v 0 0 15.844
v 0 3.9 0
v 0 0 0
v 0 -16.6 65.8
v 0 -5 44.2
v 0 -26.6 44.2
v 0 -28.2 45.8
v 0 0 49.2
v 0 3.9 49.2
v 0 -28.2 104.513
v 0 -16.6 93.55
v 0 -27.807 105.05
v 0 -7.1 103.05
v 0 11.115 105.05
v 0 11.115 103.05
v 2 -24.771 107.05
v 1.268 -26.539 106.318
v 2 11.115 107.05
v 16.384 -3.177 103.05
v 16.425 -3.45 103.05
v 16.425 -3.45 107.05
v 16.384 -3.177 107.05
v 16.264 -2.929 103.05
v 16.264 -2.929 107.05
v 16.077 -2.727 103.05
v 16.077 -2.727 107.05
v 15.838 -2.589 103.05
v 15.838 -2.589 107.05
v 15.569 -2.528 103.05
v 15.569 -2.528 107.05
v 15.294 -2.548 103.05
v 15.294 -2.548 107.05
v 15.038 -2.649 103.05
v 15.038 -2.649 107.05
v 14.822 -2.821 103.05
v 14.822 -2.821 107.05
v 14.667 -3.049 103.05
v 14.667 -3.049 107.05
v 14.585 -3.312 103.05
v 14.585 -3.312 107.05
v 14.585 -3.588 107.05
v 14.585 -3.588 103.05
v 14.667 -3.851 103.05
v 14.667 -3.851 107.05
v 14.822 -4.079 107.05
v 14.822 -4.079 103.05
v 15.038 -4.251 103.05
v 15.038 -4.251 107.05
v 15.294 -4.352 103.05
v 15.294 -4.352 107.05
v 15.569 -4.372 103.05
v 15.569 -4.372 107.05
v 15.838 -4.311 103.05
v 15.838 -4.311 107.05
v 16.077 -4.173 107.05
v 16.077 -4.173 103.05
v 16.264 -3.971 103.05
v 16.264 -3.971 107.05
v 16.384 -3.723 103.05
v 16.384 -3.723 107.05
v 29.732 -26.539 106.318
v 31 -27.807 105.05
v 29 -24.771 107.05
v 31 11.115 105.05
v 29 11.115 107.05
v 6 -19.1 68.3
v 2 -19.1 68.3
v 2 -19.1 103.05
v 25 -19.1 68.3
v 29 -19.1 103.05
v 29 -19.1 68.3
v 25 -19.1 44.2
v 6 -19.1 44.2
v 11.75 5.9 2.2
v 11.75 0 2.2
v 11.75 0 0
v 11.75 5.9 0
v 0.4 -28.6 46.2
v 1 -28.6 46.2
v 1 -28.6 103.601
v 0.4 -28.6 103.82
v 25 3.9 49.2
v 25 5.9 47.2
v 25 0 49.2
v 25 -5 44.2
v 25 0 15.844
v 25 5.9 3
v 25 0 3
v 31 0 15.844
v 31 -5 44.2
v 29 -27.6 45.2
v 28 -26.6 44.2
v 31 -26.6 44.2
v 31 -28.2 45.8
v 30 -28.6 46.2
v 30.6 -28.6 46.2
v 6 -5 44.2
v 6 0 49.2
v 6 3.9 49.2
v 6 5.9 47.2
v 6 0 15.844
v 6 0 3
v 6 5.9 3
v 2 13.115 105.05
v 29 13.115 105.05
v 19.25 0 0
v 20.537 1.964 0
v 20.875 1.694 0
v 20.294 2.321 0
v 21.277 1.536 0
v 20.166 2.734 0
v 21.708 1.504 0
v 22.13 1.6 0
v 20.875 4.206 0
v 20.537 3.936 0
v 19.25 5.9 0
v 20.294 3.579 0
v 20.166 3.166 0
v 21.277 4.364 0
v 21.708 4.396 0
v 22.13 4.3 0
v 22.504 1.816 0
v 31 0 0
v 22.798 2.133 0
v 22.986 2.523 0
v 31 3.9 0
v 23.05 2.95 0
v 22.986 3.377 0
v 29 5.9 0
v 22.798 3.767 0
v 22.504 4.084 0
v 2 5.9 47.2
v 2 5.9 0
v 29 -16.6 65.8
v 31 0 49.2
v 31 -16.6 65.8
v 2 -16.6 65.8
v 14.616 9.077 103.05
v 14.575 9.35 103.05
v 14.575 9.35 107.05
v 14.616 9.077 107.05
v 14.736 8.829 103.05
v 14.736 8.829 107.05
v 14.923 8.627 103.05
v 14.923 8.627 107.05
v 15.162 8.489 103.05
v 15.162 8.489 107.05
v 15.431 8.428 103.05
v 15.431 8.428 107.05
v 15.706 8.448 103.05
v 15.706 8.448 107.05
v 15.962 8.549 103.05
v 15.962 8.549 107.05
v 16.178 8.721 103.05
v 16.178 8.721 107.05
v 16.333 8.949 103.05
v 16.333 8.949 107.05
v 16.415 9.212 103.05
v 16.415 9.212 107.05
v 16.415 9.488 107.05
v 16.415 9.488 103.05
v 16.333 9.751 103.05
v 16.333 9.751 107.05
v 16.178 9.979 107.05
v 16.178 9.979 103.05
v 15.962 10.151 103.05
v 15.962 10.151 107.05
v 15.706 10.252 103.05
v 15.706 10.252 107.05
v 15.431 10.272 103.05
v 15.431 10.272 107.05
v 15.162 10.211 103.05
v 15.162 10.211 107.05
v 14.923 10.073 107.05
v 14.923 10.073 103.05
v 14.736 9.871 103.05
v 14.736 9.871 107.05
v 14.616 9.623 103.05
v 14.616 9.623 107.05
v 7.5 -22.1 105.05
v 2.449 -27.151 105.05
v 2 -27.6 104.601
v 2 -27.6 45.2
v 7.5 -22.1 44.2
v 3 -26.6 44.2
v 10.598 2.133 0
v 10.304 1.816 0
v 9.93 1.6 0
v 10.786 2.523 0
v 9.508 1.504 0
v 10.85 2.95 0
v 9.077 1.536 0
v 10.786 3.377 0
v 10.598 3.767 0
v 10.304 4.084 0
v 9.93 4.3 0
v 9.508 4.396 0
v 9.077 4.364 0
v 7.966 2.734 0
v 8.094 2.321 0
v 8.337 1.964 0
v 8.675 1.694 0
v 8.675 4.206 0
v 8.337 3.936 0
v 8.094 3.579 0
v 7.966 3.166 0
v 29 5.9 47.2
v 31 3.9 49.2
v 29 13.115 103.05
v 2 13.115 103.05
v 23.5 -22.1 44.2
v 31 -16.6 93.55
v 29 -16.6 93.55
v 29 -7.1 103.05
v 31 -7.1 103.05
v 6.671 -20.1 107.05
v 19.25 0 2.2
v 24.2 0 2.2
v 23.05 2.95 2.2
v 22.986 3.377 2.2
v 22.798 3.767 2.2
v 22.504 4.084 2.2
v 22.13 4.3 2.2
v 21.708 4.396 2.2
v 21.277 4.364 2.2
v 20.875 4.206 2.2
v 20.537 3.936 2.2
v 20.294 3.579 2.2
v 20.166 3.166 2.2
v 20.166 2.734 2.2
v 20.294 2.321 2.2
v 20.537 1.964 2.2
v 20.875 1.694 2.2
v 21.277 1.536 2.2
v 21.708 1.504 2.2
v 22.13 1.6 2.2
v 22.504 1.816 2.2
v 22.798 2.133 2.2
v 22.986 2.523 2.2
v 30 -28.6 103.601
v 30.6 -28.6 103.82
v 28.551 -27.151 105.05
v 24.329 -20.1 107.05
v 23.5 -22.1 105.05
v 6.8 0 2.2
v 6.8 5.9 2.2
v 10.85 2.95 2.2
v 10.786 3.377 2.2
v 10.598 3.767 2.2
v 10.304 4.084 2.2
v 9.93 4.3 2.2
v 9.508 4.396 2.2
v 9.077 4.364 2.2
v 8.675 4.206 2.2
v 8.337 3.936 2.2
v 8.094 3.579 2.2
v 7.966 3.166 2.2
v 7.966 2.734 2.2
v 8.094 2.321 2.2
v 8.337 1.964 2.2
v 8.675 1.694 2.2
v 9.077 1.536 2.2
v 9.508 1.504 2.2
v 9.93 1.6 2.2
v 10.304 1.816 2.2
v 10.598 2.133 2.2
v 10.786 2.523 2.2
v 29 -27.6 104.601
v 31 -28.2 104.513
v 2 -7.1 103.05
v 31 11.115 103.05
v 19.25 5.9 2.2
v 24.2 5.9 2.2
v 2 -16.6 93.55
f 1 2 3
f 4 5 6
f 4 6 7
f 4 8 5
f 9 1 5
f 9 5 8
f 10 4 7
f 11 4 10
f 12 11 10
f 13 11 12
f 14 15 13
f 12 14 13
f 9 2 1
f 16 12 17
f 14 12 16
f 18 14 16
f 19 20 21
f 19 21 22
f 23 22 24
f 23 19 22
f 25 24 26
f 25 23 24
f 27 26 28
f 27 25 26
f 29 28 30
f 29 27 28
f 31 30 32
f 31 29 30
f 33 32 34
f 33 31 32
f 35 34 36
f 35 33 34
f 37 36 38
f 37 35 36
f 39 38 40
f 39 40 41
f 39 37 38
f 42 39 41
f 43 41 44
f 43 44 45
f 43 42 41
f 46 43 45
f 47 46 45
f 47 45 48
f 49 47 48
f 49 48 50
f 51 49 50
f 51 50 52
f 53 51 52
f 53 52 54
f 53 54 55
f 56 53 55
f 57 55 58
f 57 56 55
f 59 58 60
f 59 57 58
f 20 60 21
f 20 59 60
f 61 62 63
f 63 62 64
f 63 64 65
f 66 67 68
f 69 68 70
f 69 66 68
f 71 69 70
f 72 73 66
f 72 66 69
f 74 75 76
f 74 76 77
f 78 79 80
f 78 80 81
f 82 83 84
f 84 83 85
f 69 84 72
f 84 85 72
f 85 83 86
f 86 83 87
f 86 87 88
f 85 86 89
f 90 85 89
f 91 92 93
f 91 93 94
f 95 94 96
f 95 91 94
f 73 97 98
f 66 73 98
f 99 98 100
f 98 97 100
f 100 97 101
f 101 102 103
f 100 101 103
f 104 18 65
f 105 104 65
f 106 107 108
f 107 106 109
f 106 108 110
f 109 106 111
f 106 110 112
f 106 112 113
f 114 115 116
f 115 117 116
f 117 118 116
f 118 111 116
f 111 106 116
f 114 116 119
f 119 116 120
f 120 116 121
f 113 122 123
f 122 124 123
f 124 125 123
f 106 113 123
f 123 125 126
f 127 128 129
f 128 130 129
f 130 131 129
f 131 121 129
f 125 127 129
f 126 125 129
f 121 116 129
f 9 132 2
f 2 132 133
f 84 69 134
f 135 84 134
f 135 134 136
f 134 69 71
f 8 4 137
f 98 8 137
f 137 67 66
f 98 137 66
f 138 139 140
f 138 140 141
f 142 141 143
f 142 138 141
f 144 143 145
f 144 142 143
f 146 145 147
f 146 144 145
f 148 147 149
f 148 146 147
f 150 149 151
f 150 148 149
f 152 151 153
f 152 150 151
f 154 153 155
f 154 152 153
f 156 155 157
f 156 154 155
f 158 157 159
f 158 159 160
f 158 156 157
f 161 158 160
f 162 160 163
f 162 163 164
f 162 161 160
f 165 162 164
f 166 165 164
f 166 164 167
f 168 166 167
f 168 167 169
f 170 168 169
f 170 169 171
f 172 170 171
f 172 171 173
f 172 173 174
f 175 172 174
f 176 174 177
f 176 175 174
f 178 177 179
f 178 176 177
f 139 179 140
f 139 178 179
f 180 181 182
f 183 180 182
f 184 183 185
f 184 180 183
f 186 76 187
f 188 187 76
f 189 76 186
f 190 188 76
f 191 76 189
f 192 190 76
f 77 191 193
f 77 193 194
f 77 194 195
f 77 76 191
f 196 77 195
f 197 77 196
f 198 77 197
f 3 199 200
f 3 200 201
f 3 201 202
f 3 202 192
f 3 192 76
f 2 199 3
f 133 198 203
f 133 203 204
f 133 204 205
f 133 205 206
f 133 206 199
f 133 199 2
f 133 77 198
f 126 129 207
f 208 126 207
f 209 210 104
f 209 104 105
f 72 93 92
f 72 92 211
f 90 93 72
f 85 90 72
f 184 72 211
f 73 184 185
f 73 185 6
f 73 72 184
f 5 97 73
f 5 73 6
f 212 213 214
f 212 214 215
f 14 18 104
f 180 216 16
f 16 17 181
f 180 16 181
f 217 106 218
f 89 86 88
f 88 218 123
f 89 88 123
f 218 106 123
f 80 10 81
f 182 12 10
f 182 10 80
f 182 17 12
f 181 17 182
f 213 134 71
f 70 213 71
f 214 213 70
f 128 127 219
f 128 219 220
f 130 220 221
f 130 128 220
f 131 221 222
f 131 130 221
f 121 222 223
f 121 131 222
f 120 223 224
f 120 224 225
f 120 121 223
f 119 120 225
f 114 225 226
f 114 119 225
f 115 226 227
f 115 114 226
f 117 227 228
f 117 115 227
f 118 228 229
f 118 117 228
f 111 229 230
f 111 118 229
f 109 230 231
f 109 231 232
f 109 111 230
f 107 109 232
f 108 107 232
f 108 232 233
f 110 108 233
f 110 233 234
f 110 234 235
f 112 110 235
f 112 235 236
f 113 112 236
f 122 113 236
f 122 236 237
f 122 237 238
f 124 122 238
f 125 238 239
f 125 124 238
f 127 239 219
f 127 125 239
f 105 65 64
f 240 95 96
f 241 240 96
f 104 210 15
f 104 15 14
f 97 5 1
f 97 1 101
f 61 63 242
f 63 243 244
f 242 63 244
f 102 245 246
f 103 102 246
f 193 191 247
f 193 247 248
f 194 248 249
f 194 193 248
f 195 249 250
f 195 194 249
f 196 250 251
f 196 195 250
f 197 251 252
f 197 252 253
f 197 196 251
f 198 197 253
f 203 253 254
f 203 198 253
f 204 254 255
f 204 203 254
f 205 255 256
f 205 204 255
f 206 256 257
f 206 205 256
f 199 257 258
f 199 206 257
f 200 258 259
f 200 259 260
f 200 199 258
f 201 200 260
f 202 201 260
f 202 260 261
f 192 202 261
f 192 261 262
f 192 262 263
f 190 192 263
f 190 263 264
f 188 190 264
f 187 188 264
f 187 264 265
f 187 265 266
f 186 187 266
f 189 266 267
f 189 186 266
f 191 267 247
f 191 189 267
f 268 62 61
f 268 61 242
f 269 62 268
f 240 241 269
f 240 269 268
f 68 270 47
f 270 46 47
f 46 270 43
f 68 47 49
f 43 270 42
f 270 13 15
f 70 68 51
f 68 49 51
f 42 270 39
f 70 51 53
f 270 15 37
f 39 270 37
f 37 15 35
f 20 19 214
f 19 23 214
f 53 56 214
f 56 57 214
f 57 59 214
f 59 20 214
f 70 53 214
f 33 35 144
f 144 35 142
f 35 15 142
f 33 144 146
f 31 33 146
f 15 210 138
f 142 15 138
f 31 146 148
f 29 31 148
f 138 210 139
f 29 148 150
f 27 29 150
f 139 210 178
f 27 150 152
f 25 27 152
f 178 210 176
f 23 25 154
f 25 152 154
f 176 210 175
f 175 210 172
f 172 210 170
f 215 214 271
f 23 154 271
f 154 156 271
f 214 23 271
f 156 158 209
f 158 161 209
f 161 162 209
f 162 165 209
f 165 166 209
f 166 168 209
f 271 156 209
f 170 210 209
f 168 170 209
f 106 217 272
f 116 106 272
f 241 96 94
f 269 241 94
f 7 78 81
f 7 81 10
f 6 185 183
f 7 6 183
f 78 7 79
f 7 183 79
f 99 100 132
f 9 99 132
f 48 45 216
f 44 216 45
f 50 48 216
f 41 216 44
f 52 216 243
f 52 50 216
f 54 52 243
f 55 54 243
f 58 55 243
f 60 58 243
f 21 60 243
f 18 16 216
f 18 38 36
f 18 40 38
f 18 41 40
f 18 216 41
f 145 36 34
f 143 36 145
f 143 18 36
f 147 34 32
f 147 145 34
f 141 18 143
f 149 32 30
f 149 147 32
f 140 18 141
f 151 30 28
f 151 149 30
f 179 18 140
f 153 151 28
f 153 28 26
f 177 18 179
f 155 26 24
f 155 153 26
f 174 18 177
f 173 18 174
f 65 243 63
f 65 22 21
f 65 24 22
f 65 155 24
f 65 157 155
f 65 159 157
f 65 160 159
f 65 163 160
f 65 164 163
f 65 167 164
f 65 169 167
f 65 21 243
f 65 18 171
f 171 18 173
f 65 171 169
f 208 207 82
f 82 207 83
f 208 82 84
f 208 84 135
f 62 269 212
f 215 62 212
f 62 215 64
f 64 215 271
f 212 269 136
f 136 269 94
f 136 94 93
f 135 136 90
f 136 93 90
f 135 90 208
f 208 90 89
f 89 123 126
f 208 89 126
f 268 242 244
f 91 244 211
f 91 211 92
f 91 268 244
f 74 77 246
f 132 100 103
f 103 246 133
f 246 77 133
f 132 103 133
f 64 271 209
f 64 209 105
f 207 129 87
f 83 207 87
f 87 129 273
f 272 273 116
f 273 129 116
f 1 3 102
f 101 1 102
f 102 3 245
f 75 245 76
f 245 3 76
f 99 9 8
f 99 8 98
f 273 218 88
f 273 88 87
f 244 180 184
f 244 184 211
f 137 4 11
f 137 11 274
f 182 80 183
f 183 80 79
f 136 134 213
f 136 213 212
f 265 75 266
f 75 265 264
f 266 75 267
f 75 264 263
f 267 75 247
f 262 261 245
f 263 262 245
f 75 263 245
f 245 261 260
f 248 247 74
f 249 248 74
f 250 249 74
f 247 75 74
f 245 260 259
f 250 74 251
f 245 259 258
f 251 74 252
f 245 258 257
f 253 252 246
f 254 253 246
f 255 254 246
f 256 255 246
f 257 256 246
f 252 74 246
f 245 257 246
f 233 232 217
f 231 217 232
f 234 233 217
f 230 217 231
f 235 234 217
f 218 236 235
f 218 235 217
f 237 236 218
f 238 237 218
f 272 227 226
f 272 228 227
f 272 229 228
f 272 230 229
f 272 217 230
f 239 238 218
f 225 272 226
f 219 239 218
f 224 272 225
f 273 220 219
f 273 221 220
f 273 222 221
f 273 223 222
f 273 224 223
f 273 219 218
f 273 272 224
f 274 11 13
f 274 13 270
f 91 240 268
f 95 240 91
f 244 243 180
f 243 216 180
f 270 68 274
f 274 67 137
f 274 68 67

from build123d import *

# Parameters (mm, degrees)
SKETCH1_R             = 1.45
BOSS_EXTRUDE1_DEPTH   = 2.2
BOSS_EXTRUDE1_2_DEPTH = 2.2
SKETCH8_W             = 6
SKETCH8_H             = 5.9
BOSS_EXTRUDE6_DEPTH   = 42
BOSS_EXTRUDE7_DEPTH   = 5
SKETCH10_W            = 31
SKETCH10_H            = 3
BOSS_EXTRUDE8_DEPTH   = 53.85
SKETCH11_W            = 31
SKETCH11_H            = 35.214875224
SKETCH11_R            = 0.925
BOSS_EXTRUDE9_DEPTH   = 4
CHAMFER6_SIZE         = 19.1
CHAMFER7_SIZE         = 12
CHAMFER8_SIZE         = 2
CUT_EXTRUDE2_START    = 2
CUT_EXTRUDE2_DEPTH    = 27
CHAMFER10_SIZE        = 0.8
SKETCH14_W            = 7.5
SKETCH14_H            = 5.9
CUT_EXTRUDE3_DEPTH    = 112.547893301
CHAMFER11_SIZE        = 5
CHAMFER11_SIZE2       = 28.356409098
SKETCH15_W            = 2
SKETCH15_H            = 27.75
BOSS_EXTRUDE10_DEPTH  = 2.5
BOSS_EXTRUDE11_DEPTH  = 6.5
CHAMFER12_SIZE        = 1
CHAMFER13_SIZE        = 5.5
CHAMFER14_SIZE        = 1.464101615
CHAMFER14_SIZE_2      = 2
CHAMFER15_SIZE        = 0.4


# Some blends are built 0.0001 mm under size
with BuildPart() as part:
    # Sketch1 → Boss-Extrude1 (new body)
    with BuildSketch(Plane.XY):
        Polygon((0, 0), (0, 5.9), (12.25, 5.9), (12.25, 0), (2.5, 0), align=None)
        with Locations((9.4, 2.95)):
            Circle(SKETCH1_R, mode=Mode.SUBTRACT)
    extrude(amount=BOSS_EXTRUDE1_DEPTH)



with BuildPart() as body_2:
    # Sketch1 → Boss-Extrude1 2 (new body)
    with BuildSketch(Plane.XY):
        Polygon((31, 0), (31, 5.9), (18.75, 5.9), (18.75, 0), (28.5, 0), align=None)
        with Locations((21.6, 2.95)):
            Circle(SKETCH1_R, mode=Mode.SUBTRACT)
    extrude(amount=BOSS_EXTRUDE1_2_DEPTH)


with BuildPart() as part_1:
    add(part.part)

    add(body_2.part)  # Boss-Extrude6 merges body 2
    # Sketch8 → Boss-Extrude6 (add)
    with BuildSketch(Plane.XY.offset(2.2)):
        with Locations((3, 2.95)):
            Rectangle(SKETCH8_W, SKETCH8_H)
        with Locations((28, 2.95)):
            Rectangle(SKETCH8_W, SKETCH8_H)
    extrude(amount=BOSS_EXTRUDE6_DEPTH)

    # Sketch9 → Boss-Extrude7 (add)
    with BuildSketch(Plane.XY.offset(44.2)):
        Polygon((0, 5.9), (0, -22.1), (31, -22.1), (31, 5.9), (25, 5.9), (25, -19.1), (6, -19.1), (6, 5.9), align=None)
    extrude(amount=BOSS_EXTRUDE7_DEPTH)

    # Sketch10 → Boss-Extrude8 (add)
    with BuildSketch(Plane.XY.offset(49.2)):
        with Locations((15.5, -20.6)):
            Rectangle(SKETCH10_W, SKETCH10_H)
    extrude(amount=BOSS_EXTRUDE8_DEPTH)

    # Sketch11 → Boss-Extrude9 (add)
    with BuildSketch(Plane.XY.offset(103.05)):
        with Locations((15.5, -4.492562388)):
            Rectangle(SKETCH11_W, SKETCH11_H)
        with Locations((15.5, -3.45)):
            Circle(SKETCH11_R, mode=Mode.SUBTRACT)
        with Locations(Location((15.5, 9.35, 0), (0, 0, 180))):
            Circle(SKETCH11_R, mode=Mode.SUBTRACT)
    extrude(amount=BOSS_EXTRUDE9_DEPTH)

    # Chamfer6
    chamfer6_edges = [part_1.edges().sort_by_distance(p)[0] for p in [
        (3, -19.1, 49.2),
        (28, -19.1, 49.2),
    ]]
    chamfer(chamfer6_edges, length=CHAMFER6_SIZE)

    # Chamfer7
    chamfer7_edges = [part_1.edges().sort_by_distance(p)[0] for p in [
        (15.5, -19.1, 103.05),
    ]]
    chamfer(chamfer7_edges, length=CHAMFER7_SIZE)

    # Chamfer8
    chamfer8_edges = [part_1.edges().sort_by_distance(p)[0] for p in [
        (0, -4.492562388, 107.05),
        (31, -4.492562388, 107.05),
        (15.5, 13.114875224, 107.05),
        (0, 13.114875224, 105.05),
        (31, 13.114875224, 105.05),
        (31, 5.9, 24.6),
        (3, 5.9, 49.2),
        (28, 5.9, 49.2),
        (0, 5.9, 24.6),
    ]]
    chamfer(chamfer8_edges, length=CHAMFER8_SIZE)

    # Sketch13 → Cut-Extrude2 (cut)
    with BuildSketch(Plane(origin=(0, 0, 0), x_dir=(0, 0, -1), z_dir=(1, 0, 0)).offset(CUT_EXTRUDE2_START)):
        Polygon((-103.05, -7.1), (-91.05, -19.1), (-103.05, -19.1), align=None)
    extrude(amount=CUT_EXTRUDE2_DEPTH, mode=Mode.SUBTRACT)

    # Chamfer10
    chamfer10_edges = [part_1.edges().sort_by_distance(p)[0] for p in [
        (6, 2.95, 2.2),
        (25, 2.95, 2.2),
    ]]
    chamfer(chamfer10_edges, length=CHAMFER10_SIZE)

    # Sketch14 → Cut-Extrude3 (cut, through all)
    with BuildSketch(Plane.XY.offset(2.2)):
        with Locations((15.5, 2.95)):
            Rectangle(SKETCH14_W, SKETCH14_H)
    extrude(amount=-CUT_EXTRUDE3_DEPTH, mode=Mode.SUBTRACT)

    # Chamfer11
    chamfer11_edges = [part_1.edges().sort_by_distance(p)[0] for p in [
        (3, 0, 44.2),
        (28, 0, 44.2),
    ]]
    chamfer11_side = [part_1.faces().sort_by_distance(p)[0] for p in [
        (3, -0.380711177, 44.2),
    ]]
    chamfer(chamfer11_edges, length=CHAMFER11_SIZE, length2=CHAMFER11_SIZE2, reference=chamfer11_side[0])

    # Sketch15 → Boss-Extrude10 (add)
    with BuildSketch(Plane(origin=(0, -19.1, 0), x_dir=(1, 0, 0), z_dir=(0, 1, 0))):
        with Locations((1, -79.675)):
            Rectangle(SKETCH15_W, SKETCH15_H)
        with Locations((30, -79.675)):
            Rectangle(SKETCH15_W, SKETCH15_H)
    extrude(amount=BOSS_EXTRUDE10_DEPTH)

    # Sketch16 → Boss-Extrude11 (add)
    with BuildSketch(Plane.XZ.offset(22.1)):
        Polygon((2, 107.05), (2, 44.2), (0, 44.2), (0, 105.05), align=None)
        Polygon((29, 107.05), (29, 44.2), (31, 44.2), (31, 105.05), align=None)
    extrude(amount=BOSS_EXTRUDE11_DEPTH)

    # Chamfer12
    chamfer12_edges = [part_1.edges().sort_by_distance(p)[0] for p in [
        (29, -28.6, 75.625),
        (2, -28.6, 75.625),
    ]]
    chamfer(chamfer12_edges, length=CHAMFER12_SIZE)

    # Chamfer13
    chamfer13_edges = [part_1.edges().sort_by_distance(p)[0] for p in [
        (29, -22.1, 75.625),
        (2, -22.1, 75.625),
    ]]
    chamfer(chamfer13_edges, length=CHAMFER13_SIZE - 0.0001)  # a hair under: the kernel refuses the full size

    # Chamfer14
    # the kernel refuses this chamfer: 2, 1.464101615 mm, written as the material it takes off along each edge
    with BuildSketch(Plane(origin=(32.969523731, -31.569523731, 103.080476269), x_dir=(0.44444688362373996, 0.8153930851078324, -0.37094620148409235), z_dir=(-0.5773502691896258, 0.5773502691896258, 0.5773502691896258)), Plane(origin=(4.969523731, -24.630476269, 110.019523731), x_dir=(-0.4444468836237367, 0.8153930851078325, -0.37094620148409596), z_dir=(-0.5773502691896257, -0.5773502691896258, -0.5773502691896257))) as chamfer14_piece_1:
        Polygon((CHAMFER14_SIZE * 0.998648499248, CHAMFER14_SIZE * 0.0519728307677), (CHAMFER14_SIZE_2 * 0.45431445783, CHAMFER14_SIZE_2 * 0.8908413851), (0, 0), align=None)
    extrude(amount=12.018782759, mode=Mode.SUBTRACT)
    with BuildSketch(Plane(origin=(19.86319104, -18.46309104, 107.05), x_dir=(0.7068394360706733, 0.7068394360706733, 0.027495876610589075), z_dir=(0.7071067811865476, -0.7071067811865476, 0))) as chamfer14_piece_2_section:
        Polygon((CHAMFER14_SIZE_2 * 0.999621916911, -CHAMFER14_SIZE_2 * 0.0274958766106), (-CHAMFER14_SIZE_2 * 0.0274958766106, -CHAMFER14_SIZE_2 * 0.999621916911), (0, 0), align=None)
    chamfer14_piece_2 = extrude(amount=18.064765124, mode=Mode.PRIVATE)
    chamfer14_piece_2 = split(chamfer14_piece_2, bisect_by=Plane(origin=(26.660831265, -22.1, 106.348363543), z_dir=(0, -1, 0)), keep=Keep.TOP, mode=Mode.PRIVATE)
    add(chamfer14_piece_2, mode=Mode.SUBTRACT)
    with BuildSketch(Plane(origin=(2.356534024, -22.1, 107.05), x_dir=(0, 0.9996219169112968, 0.0274958766105891), z_dir=(1, 0, 0))) as chamfer14_piece_3_section:
        Polygon((CHAMFER14_SIZE_2 * 0.999621916911, -CHAMFER14_SIZE_2 * 0.0274958766106), (-CHAMFER14_SIZE_2 * 0.0274958766106, -CHAMFER14_SIZE_2 * 0.999621916911), (0, 0), align=None)
    chamfer14_piece_3 = extrude(amount=26.286931952, mode=Mode.PRIVATE)
    chamfer14_piece_3 = split(chamfer14_piece_3, bisect_by=Plane(origin=(19.18755831, -17.78745831, 106.371913367), z_dir=(-0.7071067811865476, -0.7071067811865476, 0)), keep=Keep.TOP, mode=Mode.PRIVATE)
    chamfer14_piece_3 = split(chamfer14_piece_3, bisect_by=Plane(origin=(11.81244169, -17.78745831, 106.371913367), z_dir=(0.7071067811865476, -0.7071067811865476, 0)), keep=Keep.TOP, mode=Mode.PRIVATE)
    add(chamfer14_piece_3, mode=Mode.SUBTRACT)
    with BuildSketch(Plane(origin=(-1.63690896, -31.23680896, 107.05), x_dir=(-0.7068394360706735, 0.7068394360706735, 0.02749587661058907), z_dir=(0.7071067811865476, 0.7071067811865476, 0))) as chamfer14_piece_4_section:
        Polygon((CHAMFER14_SIZE_2 * 0.999621916911, -CHAMFER14_SIZE_2 * 0.0274958766106), (-CHAMFER14_SIZE_2 * 0.0274958766106, -CHAMFER14_SIZE_2 * 0.999621916911), (0, 0), align=None)
    chamfer14_piece_4 = extrude(amount=18.064765124, mode=Mode.PRIVATE)
    chamfer14_piece_4 = split(chamfer14_piece_4, bisect_by=Plane(origin=(-0.06712973, -22.1, 106.41381375), z_dir=(0, -1, 0)), keep=Keep.TOP, mode=Mode.PRIVATE)
    add(chamfer14_piece_4, mode=Mode.SUBTRACT)
    with BuildSketch(Plane(origin=(6.143365976, -28.6, 44.2), x_dir=(0, 0.9996219169112968, -0.027495876610585647), z_dir=(-1, 0, 0))) as chamfer14_piece_5:
        Polygon((CHAMFER14_SIZE_2 * 0.999621916911, -CHAMFER14_SIZE_2 * 0.0274958766106), (-CHAMFER14_SIZE_2 * 0.0274958766106, -CHAMFER14_SIZE_2 * 0.999621916911), (0, 0), align=None)
    extrude(amount=11.286731952, mode=Mode.SUBTRACT)
    with BuildSketch(Plane(origin=(24.856634024, -28.6, 44.2), x_dir=(0, 0.9996219169112968, -0.027495876610585647), z_dir=(1, 0, 0))) as chamfer14_piece_6:
        Polygon((CHAMFER14_SIZE_2 * 0.999621916911, CHAMFER14_SIZE_2 * 0.0274958766106), (-CHAMFER14_SIZE_2 * 0.0274958766106, CHAMFER14_SIZE_2 * 0.999621916911), (0, 0), align=None)
    extrude(amount=11.286731952, mode=Mode.SUBTRACT)
    with BuildSketch(Plane(origin=(2.356534024, -22.1, 107.05), x_dir=(0, 0.9996219169112968, 0.0274958766105891), z_dir=(1, 0, 0))) as chamfer14_piece_7a_section:
        Polygon((CHAMFER14_SIZE_2 * 0.999621916911, -CHAMFER14_SIZE_2 * 0.0274958766106), (-CHAMFER14_SIZE_2 * 0.0274958766106, -CHAMFER14_SIZE_2 * 0.999621916911), (0, 0), align=None)
    chamfer14_piece_7a = extrude(amount=26.286931952, mode=Mode.PRIVATE)
    chamfer14_piece_7a = split(chamfer14_piece_7a, bisect_by=Plane(origin=(24.258421627, -22.858321627, 106.41381375), z_dir=(0.7071067811865476, 0.7071067811865476, 0)), keep=Keep.TOP, mode=Mode.PRIVATE)
    with BuildSketch(Plane(origin=(19.86319104, -18.46309104, 107.05), x_dir=(0.7068394360706733, 0.7068394360706733, 0.027495876610589075), z_dir=(0.7071067811865476, -0.7071067811865476, 0))) as chamfer14_piece_7b_section:
        Polygon((CHAMFER14_SIZE_2 * 0.999621916911, -CHAMFER14_SIZE_2 * 0.0274958766106), (-CHAMFER14_SIZE_2 * 0.0274958766106, -CHAMFER14_SIZE_2 * 0.999621916911), (0, 0), align=None)
    chamfer14_piece_7b = extrude(amount=18.064765124, mode=Mode.PRIVATE)
    chamfer14_piece_7b = split(chamfer14_piece_7b, bisect_by=Plane(origin=(22.427671271, -22.1, 106.41381375), z_dir=(0, 1, 0)), keep=Keep.TOP, mode=Mode.PRIVATE)
    chamfer14_piece_7 = chamfer14_piece_7a & chamfer14_piece_7b
    add(chamfer14_piece_7, mode=Mode.SUBTRACT)
    with BuildSketch(Plane(origin=(2.356534024, -22.1, 107.05), x_dir=(0, 0.9996219169112968, 0.0274958766105891), z_dir=(1, 0, 0))) as chamfer14_piece_8a_section:
        Polygon((CHAMFER14_SIZE_2 * 0.999621916911, -CHAMFER14_SIZE_2 * 0.0274958766106), (-CHAMFER14_SIZE_2 * 0.0274958766106, -CHAMFER14_SIZE_2 * 0.999621916911), (0, 0), align=None)
    chamfer14_piece_8a = extrude(amount=26.286931952, mode=Mode.PRIVATE)
    chamfer14_piece_8a = split(chamfer14_piece_8a, bisect_by=Plane(origin=(6.741578373, -22.858321627, 106.41381375), z_dir=(-0.7071067811865476, 0.7071067811865476, 0)), keep=Keep.TOP, mode=Mode.PRIVATE)
    with BuildSketch(Plane(origin=(-1.63690896, -31.23680896, 107.05), x_dir=(-0.7068394360706735, 0.7068394360706735, 0.02749587661058907), z_dir=(0.7071067811865476, 0.7071067811865476, 0))) as chamfer14_piece_8b_section:
        Polygon((CHAMFER14_SIZE_2 * 0.999621916911, -CHAMFER14_SIZE_2 * 0.0274958766106), (-CHAMFER14_SIZE_2 * 0.0274958766106, -CHAMFER14_SIZE_2 * 0.999621916911), (0, 0), align=None)
    chamfer14_piece_8b = extrude(amount=18.064765124, mode=Mode.PRIVATE)
    chamfer14_piece_8b = split(chamfer14_piece_8b, bisect_by=Plane(origin=(8.572328729, -22.1, 106.41381375), z_dir=(0, 1, 0)), keep=Keep.TOP, mode=Mode.PRIVATE)
    chamfer14_piece_8 = chamfer14_piece_8a & chamfer14_piece_8b
    add(chamfer14_piece_8, mode=Mode.SUBTRACT)

    # Chamfer15
    chamfer15_edges = [part_1.edges().sort_by_distance(p)[0] for p in [
        (0, -28.6, 75.083267831),
        (31, -28.6, 75.083267831),
    ]]
    chamfer(chamfer15_edges, length=CHAMFER15_SIZE)


solid = part_1.part
